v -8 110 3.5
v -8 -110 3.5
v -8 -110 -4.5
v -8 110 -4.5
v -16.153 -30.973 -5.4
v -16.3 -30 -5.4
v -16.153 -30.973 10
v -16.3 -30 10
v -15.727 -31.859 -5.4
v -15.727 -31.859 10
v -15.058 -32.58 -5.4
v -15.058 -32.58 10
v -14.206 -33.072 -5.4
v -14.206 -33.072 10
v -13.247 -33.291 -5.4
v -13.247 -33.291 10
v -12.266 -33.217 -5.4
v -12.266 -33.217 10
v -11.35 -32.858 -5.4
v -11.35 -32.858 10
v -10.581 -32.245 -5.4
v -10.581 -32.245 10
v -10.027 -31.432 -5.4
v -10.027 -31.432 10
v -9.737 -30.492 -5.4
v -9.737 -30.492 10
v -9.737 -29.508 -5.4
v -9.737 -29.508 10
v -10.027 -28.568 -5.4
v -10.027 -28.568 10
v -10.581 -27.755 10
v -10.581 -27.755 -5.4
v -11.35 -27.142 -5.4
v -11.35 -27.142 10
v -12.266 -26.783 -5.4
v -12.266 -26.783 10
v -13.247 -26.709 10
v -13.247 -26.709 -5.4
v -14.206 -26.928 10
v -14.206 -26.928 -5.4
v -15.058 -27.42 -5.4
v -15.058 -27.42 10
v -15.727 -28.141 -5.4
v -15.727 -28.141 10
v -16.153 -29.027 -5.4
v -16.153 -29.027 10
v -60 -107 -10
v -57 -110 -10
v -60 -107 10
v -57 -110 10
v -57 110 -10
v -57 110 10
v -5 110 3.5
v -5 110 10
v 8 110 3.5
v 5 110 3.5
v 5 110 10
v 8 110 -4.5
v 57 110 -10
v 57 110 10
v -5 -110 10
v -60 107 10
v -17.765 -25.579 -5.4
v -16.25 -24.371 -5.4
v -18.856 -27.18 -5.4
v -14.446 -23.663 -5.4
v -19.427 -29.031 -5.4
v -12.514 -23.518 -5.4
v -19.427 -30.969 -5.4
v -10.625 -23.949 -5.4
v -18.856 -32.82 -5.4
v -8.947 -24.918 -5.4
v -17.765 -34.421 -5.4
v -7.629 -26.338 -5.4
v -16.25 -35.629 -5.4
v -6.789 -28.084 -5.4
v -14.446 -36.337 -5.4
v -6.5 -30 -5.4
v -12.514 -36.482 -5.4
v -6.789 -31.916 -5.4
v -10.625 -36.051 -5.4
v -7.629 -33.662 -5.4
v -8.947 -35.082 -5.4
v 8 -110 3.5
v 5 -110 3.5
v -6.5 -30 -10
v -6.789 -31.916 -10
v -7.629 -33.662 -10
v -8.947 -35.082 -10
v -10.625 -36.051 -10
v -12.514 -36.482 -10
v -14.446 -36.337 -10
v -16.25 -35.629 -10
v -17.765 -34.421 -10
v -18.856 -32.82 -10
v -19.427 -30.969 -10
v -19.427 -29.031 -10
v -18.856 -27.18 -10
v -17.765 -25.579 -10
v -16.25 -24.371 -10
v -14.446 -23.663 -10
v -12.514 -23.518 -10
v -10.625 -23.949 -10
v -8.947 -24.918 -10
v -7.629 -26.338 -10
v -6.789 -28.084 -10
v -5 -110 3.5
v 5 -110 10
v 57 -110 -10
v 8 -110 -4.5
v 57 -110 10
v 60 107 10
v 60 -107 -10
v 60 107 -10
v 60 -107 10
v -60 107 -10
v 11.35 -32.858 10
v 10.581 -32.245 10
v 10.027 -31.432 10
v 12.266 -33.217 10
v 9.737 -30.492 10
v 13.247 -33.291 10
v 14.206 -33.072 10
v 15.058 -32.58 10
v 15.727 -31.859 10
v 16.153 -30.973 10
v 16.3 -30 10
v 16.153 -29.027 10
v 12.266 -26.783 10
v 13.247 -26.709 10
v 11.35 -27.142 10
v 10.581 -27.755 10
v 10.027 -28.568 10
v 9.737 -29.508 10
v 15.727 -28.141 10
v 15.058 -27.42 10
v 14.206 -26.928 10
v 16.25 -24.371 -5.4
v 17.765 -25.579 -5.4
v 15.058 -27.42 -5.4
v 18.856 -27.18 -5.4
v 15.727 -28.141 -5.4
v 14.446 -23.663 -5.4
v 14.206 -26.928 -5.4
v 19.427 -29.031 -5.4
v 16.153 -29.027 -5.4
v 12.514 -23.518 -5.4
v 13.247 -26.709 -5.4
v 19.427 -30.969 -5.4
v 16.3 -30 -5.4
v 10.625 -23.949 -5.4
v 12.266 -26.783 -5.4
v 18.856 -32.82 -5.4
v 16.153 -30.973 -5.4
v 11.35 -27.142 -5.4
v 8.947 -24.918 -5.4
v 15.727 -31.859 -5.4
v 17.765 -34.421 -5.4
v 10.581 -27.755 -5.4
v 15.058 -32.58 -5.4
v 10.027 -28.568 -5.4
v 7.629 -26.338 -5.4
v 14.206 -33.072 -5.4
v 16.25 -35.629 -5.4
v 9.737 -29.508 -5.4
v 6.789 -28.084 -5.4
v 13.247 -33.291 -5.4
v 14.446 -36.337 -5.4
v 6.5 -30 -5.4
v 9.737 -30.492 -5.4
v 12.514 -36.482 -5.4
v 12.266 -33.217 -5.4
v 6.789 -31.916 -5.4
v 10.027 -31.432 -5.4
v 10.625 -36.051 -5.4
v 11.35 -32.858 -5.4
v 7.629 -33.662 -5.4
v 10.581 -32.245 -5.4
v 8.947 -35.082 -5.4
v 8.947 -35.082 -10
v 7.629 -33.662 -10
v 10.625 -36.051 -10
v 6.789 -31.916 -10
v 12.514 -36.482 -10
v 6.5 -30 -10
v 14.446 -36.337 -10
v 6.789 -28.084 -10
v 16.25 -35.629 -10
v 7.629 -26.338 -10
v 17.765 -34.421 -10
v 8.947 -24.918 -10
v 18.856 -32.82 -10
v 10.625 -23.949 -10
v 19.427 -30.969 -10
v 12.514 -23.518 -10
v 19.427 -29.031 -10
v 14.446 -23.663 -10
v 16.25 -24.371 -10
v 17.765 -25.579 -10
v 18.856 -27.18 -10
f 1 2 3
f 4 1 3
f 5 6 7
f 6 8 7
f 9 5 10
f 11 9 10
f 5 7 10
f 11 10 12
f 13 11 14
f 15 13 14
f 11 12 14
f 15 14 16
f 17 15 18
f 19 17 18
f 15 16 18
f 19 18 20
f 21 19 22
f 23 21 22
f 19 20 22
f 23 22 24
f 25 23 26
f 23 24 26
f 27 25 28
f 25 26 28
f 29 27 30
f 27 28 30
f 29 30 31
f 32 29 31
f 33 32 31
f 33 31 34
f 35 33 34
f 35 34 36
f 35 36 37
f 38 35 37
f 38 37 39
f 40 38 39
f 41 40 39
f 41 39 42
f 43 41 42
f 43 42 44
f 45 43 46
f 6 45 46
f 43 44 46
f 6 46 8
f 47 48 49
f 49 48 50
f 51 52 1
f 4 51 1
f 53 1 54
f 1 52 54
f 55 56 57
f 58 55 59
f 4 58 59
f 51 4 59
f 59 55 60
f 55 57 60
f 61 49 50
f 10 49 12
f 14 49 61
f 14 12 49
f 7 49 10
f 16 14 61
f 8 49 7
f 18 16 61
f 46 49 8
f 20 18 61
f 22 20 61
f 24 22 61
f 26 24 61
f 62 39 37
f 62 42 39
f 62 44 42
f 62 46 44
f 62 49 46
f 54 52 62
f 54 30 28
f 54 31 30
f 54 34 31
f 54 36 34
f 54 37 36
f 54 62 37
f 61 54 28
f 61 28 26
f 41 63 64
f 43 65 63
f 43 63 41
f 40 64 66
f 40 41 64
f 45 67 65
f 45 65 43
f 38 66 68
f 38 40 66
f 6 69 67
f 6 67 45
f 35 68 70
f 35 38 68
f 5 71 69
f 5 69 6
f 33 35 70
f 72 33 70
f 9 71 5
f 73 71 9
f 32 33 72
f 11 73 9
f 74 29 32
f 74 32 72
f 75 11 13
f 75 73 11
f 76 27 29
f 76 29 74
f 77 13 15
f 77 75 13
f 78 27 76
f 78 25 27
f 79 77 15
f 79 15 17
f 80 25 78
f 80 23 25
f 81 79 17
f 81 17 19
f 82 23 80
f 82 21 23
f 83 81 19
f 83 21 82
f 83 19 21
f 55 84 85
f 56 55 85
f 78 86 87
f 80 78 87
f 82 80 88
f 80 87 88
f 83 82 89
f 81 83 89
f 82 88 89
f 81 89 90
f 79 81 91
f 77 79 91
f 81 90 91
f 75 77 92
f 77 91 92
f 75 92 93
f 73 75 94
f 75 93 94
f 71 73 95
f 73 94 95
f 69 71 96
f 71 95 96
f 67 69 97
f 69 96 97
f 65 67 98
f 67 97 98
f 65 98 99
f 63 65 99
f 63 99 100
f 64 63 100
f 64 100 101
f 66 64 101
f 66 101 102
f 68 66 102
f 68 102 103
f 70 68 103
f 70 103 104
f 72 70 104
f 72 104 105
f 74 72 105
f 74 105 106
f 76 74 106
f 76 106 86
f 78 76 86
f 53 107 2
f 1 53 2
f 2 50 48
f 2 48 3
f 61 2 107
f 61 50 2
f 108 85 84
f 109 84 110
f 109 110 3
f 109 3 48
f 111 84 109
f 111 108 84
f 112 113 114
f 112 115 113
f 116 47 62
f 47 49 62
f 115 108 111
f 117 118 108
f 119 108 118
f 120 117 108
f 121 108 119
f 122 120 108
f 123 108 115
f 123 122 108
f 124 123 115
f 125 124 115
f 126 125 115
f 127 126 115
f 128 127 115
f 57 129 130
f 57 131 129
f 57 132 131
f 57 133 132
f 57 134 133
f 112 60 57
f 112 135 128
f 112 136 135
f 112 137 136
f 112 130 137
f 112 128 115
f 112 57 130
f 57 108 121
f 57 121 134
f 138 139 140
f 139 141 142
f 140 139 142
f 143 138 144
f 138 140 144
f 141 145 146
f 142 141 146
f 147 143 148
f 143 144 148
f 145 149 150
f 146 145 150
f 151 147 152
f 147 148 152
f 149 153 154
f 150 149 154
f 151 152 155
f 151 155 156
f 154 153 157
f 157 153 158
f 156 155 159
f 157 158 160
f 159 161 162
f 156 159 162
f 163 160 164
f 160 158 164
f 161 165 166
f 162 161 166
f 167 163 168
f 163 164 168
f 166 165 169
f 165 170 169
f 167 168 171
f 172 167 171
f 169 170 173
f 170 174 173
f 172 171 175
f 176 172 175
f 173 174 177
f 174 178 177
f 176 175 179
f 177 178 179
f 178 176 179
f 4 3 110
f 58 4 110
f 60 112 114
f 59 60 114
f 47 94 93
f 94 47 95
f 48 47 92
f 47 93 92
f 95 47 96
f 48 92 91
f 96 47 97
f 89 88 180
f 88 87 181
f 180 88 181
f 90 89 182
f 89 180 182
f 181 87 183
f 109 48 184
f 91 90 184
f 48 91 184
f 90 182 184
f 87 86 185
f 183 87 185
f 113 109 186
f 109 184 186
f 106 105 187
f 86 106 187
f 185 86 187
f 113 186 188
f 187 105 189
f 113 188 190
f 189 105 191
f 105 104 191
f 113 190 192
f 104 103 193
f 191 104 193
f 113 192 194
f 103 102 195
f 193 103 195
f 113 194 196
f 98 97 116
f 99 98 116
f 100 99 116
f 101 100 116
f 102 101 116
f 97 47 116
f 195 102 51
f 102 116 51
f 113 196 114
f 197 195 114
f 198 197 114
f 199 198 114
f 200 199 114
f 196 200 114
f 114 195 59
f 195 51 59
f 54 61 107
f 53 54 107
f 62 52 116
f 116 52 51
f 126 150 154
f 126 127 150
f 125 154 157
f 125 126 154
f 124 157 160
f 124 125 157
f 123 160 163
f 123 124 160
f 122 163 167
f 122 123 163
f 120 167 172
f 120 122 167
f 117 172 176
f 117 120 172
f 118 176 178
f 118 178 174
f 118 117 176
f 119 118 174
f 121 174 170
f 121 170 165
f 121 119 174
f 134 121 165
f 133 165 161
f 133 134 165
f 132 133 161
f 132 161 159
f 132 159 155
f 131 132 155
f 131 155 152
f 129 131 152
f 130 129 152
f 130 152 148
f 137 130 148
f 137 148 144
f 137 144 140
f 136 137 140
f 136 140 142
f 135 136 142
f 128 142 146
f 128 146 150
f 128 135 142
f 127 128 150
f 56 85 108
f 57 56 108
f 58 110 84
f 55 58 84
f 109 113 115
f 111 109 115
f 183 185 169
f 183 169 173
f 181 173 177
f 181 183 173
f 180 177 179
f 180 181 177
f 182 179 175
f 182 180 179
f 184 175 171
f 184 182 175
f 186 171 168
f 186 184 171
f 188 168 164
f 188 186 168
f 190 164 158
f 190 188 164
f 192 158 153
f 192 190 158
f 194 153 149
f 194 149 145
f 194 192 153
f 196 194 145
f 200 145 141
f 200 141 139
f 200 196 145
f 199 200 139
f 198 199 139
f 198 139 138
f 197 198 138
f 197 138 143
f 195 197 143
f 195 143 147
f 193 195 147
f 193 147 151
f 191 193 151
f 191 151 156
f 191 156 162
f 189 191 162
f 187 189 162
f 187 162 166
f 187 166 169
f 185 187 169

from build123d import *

# Parameters (mm, degrees)
F0_W           = 120
F0_H           = 220
F1_DEPTH       = 10
F3_DEPTH       = 220.001
F4_SIZE        = 3
F6_D           = 6.6
F6_CBORE_D     = 13
F6_CBORE_DEPTH = 4.6


# Not quite as in the source:
# - a pattern or mirror of a feature is missing from the dataset's text; its kind, count and spacing are read off the source's solid


with BuildPart() as f1:
    # F0 (on Top) → F1 (new body, symmetric)
    with BuildSketch(Plane.XY):
        Rectangle(F0_W, F0_H)
    extrude(amount=F1_DEPTH, both=True)

    # F2 (on face) → F3 (cut, through all)
    with BuildSketch(Plane.XZ.offset(110)):
        Polygon((5, 10), (-5, 10), (-5, 3.5), (-8, 3.5), (-8, -4.5), (8, -4.5), (8, 3.5), (5, 3.5), align=None)
    extrude(amount=-F3_DEPTH, mode=Mode.SUBTRACT)

    # F4
    f4_edges = [f1.edges().sort_by_distance(p)[0] for p in [
        (60, -110, 0),
        (60, 110, 0),
        (-60, 110, 0),
        (-60, -110, 0),
    ]]
    chamfer(f4_edges, length=F4_SIZE)

    # F6 (through all)
    with Locations(Plane(origin=(0, 0, -10), x_dir=(1, 0, 0), z_dir=(0, 0, -1))):
        with Locations((-13, 30)):
            f6 = CounterBoreHole(F6_D / 2, F6_CBORE_D / 2, F6_CBORE_DEPTH)

    # F6_copies: F6 across plane
    add(f6.mirror(Plane(origin=(0, 0, 0), x_dir=(0, 0, 1), z_dir=(1, 0, 0))), mode=Mode.SUBTRACT)


solid = f1.part
